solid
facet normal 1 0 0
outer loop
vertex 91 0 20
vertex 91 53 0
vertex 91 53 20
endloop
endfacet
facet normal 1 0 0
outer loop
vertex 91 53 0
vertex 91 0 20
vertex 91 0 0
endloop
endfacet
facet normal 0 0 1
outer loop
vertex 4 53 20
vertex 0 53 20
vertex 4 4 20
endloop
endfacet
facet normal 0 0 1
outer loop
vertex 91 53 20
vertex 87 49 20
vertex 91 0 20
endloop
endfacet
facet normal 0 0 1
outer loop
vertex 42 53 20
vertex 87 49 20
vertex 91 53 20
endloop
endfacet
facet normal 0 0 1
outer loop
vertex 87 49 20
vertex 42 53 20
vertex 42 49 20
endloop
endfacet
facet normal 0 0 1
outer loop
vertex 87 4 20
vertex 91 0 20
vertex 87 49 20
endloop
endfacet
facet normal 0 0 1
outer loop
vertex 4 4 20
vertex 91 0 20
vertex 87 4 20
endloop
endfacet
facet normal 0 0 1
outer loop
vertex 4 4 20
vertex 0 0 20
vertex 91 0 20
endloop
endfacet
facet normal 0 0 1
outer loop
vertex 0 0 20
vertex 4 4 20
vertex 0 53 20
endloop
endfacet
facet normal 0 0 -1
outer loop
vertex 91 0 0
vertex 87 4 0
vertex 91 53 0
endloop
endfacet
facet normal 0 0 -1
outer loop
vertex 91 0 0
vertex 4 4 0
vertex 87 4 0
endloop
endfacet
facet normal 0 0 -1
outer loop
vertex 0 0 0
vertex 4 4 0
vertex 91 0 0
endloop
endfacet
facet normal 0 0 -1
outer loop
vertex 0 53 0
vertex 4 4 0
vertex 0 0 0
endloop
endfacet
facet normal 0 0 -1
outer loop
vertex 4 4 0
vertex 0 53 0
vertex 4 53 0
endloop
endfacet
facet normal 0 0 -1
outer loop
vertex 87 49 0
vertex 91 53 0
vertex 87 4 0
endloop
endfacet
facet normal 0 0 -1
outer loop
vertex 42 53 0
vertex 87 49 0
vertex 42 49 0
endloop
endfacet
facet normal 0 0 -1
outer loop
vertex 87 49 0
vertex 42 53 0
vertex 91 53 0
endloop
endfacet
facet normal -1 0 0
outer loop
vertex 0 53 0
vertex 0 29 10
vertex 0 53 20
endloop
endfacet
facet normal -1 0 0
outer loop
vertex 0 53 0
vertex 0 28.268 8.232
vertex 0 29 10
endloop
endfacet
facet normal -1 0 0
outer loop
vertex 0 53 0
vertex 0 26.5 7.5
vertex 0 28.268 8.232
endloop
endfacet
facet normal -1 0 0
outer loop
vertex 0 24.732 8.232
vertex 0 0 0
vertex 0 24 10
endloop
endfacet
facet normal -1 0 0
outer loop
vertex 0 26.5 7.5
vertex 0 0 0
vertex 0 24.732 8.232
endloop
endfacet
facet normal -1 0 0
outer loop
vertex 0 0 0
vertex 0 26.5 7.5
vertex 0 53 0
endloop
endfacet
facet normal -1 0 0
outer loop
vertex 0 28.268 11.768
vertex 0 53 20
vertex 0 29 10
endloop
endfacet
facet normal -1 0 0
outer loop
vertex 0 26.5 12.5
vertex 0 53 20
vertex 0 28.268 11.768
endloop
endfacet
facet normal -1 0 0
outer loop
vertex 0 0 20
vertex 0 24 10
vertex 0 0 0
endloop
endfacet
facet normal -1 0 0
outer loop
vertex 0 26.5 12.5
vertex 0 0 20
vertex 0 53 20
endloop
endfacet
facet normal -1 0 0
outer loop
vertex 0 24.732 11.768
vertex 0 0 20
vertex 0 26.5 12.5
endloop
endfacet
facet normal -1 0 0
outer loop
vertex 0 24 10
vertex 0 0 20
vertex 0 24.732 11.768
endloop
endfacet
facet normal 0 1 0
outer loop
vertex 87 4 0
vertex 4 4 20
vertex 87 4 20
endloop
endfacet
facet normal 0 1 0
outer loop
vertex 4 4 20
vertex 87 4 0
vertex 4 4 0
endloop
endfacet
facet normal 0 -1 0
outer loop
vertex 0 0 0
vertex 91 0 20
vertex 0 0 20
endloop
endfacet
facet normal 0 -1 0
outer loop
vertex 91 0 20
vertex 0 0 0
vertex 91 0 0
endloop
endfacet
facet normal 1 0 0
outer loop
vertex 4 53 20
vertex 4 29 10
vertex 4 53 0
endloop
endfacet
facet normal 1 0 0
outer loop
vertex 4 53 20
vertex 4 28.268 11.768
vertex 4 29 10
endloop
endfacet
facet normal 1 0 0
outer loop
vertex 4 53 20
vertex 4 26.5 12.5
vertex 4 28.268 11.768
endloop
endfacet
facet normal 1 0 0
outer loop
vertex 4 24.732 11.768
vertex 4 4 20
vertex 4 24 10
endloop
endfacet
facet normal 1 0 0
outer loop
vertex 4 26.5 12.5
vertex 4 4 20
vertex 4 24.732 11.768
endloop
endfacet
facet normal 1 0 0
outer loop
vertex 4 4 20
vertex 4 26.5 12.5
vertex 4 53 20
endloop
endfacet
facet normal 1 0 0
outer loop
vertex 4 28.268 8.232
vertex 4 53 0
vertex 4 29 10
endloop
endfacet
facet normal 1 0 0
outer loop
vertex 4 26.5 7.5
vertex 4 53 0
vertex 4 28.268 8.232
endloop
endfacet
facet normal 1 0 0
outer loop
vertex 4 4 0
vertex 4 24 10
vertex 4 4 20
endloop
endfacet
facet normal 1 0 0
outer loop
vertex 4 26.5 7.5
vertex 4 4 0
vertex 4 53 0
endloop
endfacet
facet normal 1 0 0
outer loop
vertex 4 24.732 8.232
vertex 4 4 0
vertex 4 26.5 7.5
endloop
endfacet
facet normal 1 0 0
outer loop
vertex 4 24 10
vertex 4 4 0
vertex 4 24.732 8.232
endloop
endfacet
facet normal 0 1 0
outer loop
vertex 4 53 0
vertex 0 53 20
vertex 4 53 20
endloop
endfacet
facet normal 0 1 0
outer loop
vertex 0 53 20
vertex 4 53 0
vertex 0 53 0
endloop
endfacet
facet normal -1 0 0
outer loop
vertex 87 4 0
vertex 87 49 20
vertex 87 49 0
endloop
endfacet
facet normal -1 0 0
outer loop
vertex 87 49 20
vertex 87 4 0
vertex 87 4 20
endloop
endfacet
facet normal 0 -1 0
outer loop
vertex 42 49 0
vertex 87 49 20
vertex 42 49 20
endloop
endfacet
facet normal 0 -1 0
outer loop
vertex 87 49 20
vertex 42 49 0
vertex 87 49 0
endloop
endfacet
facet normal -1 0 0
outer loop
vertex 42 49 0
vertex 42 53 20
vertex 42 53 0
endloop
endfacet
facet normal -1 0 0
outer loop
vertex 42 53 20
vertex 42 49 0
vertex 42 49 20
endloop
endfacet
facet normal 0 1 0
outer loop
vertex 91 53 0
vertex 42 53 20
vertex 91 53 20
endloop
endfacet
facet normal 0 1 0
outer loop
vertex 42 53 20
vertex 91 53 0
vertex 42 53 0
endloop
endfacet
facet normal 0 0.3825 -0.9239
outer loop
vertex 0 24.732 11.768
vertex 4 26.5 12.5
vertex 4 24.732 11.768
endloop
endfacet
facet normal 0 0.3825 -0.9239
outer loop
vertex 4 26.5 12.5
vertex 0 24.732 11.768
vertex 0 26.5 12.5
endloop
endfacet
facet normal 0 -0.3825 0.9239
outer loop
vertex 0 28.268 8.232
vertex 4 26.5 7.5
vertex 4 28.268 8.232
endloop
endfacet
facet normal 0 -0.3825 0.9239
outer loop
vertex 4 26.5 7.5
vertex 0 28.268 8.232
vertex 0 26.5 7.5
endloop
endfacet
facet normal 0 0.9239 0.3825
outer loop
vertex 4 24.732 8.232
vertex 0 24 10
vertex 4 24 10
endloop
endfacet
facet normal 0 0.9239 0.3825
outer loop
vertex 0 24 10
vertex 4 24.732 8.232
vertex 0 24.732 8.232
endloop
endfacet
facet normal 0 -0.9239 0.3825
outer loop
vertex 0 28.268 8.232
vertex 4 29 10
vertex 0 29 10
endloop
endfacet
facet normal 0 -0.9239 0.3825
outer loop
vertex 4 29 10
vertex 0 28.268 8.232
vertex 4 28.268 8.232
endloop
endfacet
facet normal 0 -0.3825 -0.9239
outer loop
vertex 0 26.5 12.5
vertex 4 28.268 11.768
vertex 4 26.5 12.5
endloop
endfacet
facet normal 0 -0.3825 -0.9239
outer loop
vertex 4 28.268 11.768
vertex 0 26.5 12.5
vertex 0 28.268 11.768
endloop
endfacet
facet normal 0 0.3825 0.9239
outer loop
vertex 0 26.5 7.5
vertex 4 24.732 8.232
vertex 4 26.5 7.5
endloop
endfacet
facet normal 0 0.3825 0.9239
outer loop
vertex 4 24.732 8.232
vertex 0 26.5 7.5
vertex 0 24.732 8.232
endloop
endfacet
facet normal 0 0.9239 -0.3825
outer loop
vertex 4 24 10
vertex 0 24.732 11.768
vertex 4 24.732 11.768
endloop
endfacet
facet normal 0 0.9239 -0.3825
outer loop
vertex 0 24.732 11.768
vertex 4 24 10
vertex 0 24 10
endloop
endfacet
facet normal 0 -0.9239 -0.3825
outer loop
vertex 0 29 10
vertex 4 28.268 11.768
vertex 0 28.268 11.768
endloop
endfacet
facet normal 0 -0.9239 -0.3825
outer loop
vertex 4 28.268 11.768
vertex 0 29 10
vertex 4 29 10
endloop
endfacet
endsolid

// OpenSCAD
width = 20;
//screwqty = 1;
//screwsize = 2.5;
thickness = 4;
table = 38;
psy = 45;
psx = 45;
tail = psy+(2*thickness);

difference() {
    union() {
        cube([thickness+psy+table+thickness,thickness,width]);
        cube([thickness,tail, width]);
        translate([psx+table+thickness,thickness,0]) cube([thickness,psy,width]);
        translate([thickness+table,thickness+psy,0]) cube([psx+thickness,thickness,width]);
    }
    translate([0,(tail)/2,width/2]) rotate([0,90,0]) cylinder(thickness,2.5,2.5);
}
